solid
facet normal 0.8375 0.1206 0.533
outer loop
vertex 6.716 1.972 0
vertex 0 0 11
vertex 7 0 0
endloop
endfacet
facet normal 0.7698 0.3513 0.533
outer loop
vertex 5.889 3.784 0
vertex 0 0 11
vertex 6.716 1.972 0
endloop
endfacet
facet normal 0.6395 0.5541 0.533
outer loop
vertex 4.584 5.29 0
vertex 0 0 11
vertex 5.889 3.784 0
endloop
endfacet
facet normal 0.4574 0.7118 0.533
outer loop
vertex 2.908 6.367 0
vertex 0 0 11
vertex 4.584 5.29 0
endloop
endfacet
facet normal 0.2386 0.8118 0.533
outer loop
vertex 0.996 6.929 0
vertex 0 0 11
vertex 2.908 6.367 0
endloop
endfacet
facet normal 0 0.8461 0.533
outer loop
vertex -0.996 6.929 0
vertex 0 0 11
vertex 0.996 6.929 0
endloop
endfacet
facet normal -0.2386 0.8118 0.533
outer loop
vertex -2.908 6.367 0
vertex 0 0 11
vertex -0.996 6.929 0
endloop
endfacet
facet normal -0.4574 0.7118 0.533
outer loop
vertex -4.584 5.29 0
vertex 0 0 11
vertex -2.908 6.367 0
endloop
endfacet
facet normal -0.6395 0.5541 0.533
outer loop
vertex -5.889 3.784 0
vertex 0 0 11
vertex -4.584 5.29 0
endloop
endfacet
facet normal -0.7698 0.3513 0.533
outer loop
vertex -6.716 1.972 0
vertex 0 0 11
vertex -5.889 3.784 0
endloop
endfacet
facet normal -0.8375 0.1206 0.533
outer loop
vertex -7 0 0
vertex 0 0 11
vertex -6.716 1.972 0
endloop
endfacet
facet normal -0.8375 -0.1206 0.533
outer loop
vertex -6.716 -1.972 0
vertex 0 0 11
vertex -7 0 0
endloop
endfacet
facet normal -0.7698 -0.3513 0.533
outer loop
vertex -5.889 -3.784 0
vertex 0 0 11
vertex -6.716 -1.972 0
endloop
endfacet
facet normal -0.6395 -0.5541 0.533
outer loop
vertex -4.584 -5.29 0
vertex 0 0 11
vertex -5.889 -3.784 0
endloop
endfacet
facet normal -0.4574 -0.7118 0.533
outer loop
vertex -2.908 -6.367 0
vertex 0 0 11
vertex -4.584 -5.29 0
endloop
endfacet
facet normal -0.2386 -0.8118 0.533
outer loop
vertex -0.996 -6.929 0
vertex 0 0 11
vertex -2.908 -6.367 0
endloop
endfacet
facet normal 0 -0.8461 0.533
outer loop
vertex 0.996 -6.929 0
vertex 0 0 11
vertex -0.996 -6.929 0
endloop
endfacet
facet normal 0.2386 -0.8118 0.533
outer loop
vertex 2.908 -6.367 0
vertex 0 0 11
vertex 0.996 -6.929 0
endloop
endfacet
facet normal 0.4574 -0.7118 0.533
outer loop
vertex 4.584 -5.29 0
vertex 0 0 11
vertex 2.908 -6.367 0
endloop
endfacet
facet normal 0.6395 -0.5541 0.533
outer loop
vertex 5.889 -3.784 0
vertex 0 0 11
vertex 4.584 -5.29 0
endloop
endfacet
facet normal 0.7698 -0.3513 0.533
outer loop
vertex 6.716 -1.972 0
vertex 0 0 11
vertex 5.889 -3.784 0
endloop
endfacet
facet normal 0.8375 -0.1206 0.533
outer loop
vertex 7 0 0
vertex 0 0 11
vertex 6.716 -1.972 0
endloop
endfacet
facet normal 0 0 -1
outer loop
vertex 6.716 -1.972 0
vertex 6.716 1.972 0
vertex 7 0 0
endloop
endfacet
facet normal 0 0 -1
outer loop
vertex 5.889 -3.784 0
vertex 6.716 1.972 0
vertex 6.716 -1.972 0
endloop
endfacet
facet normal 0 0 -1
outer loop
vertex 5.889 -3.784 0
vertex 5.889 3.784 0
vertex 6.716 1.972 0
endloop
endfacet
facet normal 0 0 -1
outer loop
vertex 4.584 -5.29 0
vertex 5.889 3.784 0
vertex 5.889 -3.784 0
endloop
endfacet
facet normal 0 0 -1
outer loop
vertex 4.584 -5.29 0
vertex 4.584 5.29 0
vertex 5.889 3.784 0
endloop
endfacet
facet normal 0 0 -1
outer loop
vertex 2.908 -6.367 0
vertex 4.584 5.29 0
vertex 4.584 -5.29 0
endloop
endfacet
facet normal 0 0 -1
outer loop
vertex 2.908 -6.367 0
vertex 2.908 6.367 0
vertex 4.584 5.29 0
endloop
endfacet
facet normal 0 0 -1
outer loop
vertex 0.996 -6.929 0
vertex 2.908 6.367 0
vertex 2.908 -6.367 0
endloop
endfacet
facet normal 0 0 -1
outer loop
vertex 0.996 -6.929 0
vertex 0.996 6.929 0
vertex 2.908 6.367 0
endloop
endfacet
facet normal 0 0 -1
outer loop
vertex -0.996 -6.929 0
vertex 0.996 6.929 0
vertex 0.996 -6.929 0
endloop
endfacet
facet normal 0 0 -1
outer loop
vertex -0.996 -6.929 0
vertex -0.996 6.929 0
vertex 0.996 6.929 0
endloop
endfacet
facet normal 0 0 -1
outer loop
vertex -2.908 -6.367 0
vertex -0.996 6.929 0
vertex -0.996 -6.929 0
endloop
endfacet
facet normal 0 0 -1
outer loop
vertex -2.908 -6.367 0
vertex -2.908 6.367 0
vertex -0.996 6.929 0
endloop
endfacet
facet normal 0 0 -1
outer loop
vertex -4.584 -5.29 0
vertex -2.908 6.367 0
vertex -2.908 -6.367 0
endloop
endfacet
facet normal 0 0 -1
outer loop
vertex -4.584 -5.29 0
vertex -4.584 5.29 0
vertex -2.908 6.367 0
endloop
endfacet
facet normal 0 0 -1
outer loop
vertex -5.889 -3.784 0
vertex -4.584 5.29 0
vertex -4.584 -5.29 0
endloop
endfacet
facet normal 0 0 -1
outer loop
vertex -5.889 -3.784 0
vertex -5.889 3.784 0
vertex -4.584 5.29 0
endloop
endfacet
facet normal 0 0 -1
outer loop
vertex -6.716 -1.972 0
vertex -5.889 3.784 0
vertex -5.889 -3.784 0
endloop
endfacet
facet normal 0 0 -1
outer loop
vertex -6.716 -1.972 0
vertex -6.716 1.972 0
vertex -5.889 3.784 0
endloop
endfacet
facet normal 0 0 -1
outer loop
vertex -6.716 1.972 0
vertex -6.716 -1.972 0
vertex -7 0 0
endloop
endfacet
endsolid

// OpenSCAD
// Generated by SolidPython 1.0.1 on 2020-07-29 00:46:43


cylinder(h = 11, r1 = 7, r2 = 0);
/***********************************************
*********      SolidPython code:      **********
************************************************
 
# import packages: SolidPython
from solid import *
from solid.utils import *
from itertools import chain, combinations, permutations


class Resize:

    def __init__(self, scad_file):
        self.scad_file = scad_file
        #self.scad_file = import_scad(scad_file)
        # cone/cylinder param:
        self.r1 = 0
        self.r2 = 0
        self.h = 0
        # rectangular prism param:
        self.w = 0
        self.l = 0
        # ellipse param:
        self.r = 0

    # import OpenScad code (file name corresponds to shape)


    # classify shape + parameters
    def assign(self, param1, param2, param3):
        if self.scad_file == 'cone.scad':
            self.r1 = param1
            self.r2 = param2
            self.h = param3
        elif self.scad_file == 'cylinder.scad':
            self.r1 = param1
            self.r2 = param2
            self.h = param3
        elif self.scad_file == 'rectangularPrism.scad':
            self.h = param1
            self.l = param2
            self.w = param3
        else:
            self.r = param1
            self.h = param2

    # resize parameters
    def iterate(self):
        x = range(3, 20, 2)
        i = 1
        if self.scad_file == 'cone.scad':
            tempList = list(permutations(x, 2))
            for temp in tempList:
                param1 = temp[0]
                param2 = temp[1]
                filepath = 'produced_scad_files/' + 'cone' + str(param1) + '_' + str(param2) + '_' + '.scad'
                scad_render_to_file(cylinder(h=param1, r1=param2, r2=0), filepath)

        elif self.scad_file == 'cylinder.scad':
            tempList = list(permutations(x, 3))
            for temp in tempList:
                param1 = temp[0]
                param2 = temp[1]
                filepath = 'produced_scad_files/' + 'cylinder' + str(param1) + '_' + str(param2) + '_' + '.scad'
                scad_render_to_file(cylinder(h=param1, r1=param2, r2=param2), filepath)

        elif self.scad_file == 'rectangularPrism.scad':
            tempList = list(permutations(x, 3))
            for temp in tempList:
                param1 = temp[0]
                param2 = temp[1]
                param3 = temp[2]
                filepath = 'produced_scad_files/' + 'rectangularPrism' + str(param1) + '_' + str(param2) + '_' + str(
                    param3) + '.scad'
                scad_render_to_file(cube(size=(param1, param2, param3)), filepath)

        elif self.scad_file == 'ellipse.scad':
            tempList = list(permutations(x, 4))
            for temp in tempList:
                param1 = temp[0]
                param2 = temp[1]
                param3 = temp[2]
                param4 = temp[3]
                filepath = 'produced_scad_files/' + 'ellipse' + str(param1) + '_' + str(param2) + '_' + str(param3) + '_' + str(param4) + '.scad'
                scad_render_to_file(scale([param1, param2, param3])(sphere(r=param4)), filepath)

    def render_to_scadfile(self):
        scad_render_to_file(scad, 'example.scad') 
 
************************************************/
